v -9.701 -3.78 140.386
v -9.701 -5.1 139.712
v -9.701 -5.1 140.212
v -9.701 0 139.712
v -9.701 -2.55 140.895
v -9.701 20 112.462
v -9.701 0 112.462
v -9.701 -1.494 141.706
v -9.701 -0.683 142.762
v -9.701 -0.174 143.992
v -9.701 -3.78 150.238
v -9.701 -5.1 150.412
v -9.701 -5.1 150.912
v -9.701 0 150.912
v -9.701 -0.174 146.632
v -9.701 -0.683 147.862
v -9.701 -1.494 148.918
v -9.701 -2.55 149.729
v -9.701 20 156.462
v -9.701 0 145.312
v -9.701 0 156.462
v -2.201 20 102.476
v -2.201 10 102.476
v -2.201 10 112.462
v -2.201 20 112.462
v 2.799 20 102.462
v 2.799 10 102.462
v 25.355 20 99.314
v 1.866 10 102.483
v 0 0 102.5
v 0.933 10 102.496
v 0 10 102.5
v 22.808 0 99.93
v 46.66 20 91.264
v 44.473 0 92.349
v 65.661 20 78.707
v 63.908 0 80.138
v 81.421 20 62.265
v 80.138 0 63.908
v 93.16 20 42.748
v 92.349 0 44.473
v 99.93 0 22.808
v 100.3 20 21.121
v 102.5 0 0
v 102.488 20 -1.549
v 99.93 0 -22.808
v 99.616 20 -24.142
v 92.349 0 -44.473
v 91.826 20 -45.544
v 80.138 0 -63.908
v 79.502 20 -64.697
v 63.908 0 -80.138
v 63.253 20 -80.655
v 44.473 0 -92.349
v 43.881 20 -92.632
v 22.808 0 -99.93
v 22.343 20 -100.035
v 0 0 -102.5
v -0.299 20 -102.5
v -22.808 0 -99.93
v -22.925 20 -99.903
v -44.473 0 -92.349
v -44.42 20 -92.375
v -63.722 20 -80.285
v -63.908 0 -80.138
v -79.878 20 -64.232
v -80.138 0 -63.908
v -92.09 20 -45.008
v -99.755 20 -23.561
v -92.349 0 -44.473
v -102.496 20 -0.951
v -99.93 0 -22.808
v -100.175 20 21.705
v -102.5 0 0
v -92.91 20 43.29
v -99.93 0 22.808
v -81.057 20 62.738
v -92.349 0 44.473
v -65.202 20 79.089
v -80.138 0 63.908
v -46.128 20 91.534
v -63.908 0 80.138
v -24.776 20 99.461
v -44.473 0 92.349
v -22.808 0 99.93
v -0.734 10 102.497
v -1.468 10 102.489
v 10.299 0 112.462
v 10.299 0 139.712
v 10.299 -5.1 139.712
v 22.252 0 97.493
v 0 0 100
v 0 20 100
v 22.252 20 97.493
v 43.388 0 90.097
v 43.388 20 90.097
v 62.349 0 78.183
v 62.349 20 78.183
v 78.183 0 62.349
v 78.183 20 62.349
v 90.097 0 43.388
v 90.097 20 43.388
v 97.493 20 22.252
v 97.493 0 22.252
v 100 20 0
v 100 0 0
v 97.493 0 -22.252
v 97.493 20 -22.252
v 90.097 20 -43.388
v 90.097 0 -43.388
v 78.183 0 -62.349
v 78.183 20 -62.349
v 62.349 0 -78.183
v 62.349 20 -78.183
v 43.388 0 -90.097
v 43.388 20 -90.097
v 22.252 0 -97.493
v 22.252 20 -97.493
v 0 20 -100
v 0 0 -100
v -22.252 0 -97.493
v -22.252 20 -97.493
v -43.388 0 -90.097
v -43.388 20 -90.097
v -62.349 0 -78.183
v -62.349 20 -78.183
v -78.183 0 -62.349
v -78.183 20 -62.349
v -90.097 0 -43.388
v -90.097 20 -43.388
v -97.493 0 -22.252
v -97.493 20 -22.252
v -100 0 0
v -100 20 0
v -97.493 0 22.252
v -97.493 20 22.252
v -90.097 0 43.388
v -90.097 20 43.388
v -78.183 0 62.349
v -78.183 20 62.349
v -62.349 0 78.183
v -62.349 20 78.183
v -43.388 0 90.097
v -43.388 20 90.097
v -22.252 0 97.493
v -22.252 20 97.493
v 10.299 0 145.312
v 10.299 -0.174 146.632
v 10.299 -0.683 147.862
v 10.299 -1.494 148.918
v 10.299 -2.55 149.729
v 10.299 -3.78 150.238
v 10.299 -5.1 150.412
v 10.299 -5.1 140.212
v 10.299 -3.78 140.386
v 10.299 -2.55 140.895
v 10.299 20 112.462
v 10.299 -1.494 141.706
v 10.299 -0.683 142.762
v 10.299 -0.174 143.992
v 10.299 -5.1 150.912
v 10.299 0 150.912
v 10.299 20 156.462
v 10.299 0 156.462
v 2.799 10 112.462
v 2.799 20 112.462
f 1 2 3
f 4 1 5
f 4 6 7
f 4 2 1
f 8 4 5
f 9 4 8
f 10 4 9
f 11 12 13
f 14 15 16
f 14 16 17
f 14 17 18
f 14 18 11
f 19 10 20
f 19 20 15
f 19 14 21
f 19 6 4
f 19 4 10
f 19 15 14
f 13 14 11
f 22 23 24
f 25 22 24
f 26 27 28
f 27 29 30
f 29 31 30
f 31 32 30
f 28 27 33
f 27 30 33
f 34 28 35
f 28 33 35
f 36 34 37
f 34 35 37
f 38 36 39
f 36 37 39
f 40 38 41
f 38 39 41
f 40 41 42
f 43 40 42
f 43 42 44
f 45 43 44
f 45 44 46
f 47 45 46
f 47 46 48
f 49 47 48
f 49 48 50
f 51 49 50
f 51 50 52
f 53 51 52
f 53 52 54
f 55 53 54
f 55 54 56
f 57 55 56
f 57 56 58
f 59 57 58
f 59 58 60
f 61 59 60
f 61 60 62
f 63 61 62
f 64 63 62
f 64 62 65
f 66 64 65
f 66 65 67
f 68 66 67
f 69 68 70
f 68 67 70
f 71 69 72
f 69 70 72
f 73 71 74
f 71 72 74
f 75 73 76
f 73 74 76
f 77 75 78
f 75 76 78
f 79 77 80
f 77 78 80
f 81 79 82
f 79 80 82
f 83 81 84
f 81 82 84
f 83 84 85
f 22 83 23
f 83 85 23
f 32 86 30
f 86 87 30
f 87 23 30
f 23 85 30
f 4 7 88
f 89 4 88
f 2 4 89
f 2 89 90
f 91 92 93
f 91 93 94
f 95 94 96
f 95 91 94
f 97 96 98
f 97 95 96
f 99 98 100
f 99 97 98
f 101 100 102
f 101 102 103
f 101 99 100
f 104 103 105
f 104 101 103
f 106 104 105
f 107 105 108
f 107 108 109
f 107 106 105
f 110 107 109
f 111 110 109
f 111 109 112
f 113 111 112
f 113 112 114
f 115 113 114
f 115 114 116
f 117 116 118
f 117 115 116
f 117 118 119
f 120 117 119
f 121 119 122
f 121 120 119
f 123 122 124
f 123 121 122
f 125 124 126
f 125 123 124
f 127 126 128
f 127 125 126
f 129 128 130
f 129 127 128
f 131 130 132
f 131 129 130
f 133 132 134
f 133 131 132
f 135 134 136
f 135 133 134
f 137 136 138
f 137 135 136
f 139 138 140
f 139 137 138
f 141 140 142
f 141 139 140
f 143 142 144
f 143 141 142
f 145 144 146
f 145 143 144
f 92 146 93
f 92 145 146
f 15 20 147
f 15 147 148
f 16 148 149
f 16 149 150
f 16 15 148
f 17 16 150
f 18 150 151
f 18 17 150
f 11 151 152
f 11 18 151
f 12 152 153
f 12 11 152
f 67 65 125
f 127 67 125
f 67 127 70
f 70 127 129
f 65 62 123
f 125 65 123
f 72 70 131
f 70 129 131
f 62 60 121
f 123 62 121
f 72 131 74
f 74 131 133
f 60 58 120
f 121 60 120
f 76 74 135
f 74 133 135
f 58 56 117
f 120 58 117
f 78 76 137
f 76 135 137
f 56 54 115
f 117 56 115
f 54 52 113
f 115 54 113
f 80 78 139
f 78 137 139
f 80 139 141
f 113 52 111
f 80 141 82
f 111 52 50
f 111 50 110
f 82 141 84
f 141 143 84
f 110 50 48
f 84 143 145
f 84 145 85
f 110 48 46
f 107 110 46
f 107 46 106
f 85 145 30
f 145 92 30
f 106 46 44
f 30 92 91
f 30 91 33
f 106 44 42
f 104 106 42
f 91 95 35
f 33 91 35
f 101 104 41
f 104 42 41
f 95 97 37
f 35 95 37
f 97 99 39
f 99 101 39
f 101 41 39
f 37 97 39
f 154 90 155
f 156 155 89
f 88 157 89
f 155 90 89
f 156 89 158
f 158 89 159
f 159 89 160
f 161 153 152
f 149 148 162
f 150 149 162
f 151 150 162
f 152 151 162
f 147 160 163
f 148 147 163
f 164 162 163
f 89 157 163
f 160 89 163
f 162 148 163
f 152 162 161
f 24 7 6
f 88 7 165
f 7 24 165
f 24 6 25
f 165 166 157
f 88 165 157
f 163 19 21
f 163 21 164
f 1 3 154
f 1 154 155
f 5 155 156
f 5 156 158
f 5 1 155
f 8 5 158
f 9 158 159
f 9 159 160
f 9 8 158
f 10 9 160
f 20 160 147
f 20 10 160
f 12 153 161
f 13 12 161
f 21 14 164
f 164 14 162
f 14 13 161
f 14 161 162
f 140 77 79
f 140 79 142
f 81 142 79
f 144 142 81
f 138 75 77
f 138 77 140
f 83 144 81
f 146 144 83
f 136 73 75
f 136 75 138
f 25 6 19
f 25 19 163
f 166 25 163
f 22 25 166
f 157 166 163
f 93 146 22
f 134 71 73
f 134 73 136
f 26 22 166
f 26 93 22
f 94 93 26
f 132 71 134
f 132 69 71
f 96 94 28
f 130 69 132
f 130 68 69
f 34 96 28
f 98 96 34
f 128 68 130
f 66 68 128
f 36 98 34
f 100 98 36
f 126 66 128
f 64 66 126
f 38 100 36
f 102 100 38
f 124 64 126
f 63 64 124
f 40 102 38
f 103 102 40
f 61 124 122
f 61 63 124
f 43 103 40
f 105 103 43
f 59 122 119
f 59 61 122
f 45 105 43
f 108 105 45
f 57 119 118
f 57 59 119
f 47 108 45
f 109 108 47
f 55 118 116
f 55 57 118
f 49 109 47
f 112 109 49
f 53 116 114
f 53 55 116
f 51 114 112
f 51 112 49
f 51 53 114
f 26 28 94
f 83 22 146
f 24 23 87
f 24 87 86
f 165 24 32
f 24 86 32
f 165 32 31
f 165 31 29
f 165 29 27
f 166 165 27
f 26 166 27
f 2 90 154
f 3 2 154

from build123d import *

# Parameters (mm, degrees)
SKETCH1_R           = 102.5
SKETCH1_R_2         = 100
BOSS_EXTRUDE1_DEPTH = 20
BOSS_EXTRUDE2_START = -10
BOSS_EXTRUDE2_DEPTH = 10
SKETCH3_W           = 20
SKETCH3_H           = 20
BOSS_EXTRUDE3_DEPTH = 44
BOSS_EXTRUDE5_DEPTH = 20


with BuildPart() as part:
    # Sketch1 → Boss-Extrude1 (new body)
    with BuildSketch(Plane(origin=(0, 0, 0), x_dir=(1, 0, 0), z_dir=(0, 1, 0))):
        with Locations(Location((0, 0, 0), (0, 0, 270))):
            Circle(SKETCH1_R)
        with Locations(Location((0, 0, 0), (0, 0, 270))):
            Circle(SKETCH1_R_2, mode=Mode.SUBTRACT)
    extrude(amount=BOSS_EXTRUDE1_DEPTH)

    # Sketch2 → Boss-Extrude2 (add)
    with BuildSketch(Plane(origin=(0, 20, 0), x_dir=(1, 0, 0), z_dir=(0, 1, 0)).offset(BOSS_EXTRUDE2_START)):
        with BuildLine():
            ThreePointArc((2.798561789, -102.461788253), (0.298650634, -102.499564915), (-2.201438211, -102.476356638))
            Line((-2.201438211, -102.476356638), (-2.201438211, -112.461788253))
            Line((-2.201438211, -112.461788253), (2.798561789, -112.461788253))
            Line((2.798561789, -112.461788253), (2.798561789, -102.461788253))
        make_face()
    extrude(amount=BOSS_EXTRUDE2_DEPTH)

    # Sketch3 → Boss-Extrude3 (add)
    with BuildSketch(Plane.XY.offset(112.461788253)):
        with Locations((0.298561789, 10)):
            Rectangle(SKETCH3_W, SKETCH3_H)
    extrude(amount=BOSS_EXTRUDE3_DEPTH)

    # Sketch4 → Boss-Extrude5 (add)
    with BuildSketch(Plane.ZY.offset(9.701438211)):
        with BuildLine():
            Line((145.311788254, 0), (139.711788253, 0))
            Line((139.711788253, 0), (139.711788253, -5.1))
            Line((139.711788253, -5.1), (140.211788253, -5.1))
            ThreePointArc((140.211788253, -5.1), (141.705543669, -1.493755415), (145.311788254, 0))
        make_face()
        with BuildLine():
            Line((150.911788253, 0), (145.311788254, 0))
            ThreePointArc((145.311788254, 0), (148.918032837, -1.493755416), (150.411788253, -5.1))
            Line((150.411788253, -5.1), (150.911788253, -5.1))
            Line((150.911788253, -5.1), (150.911788253, 0))
        make_face()
    extrude(amount=-BOSS_EXTRUDE5_DEPTH)


solid = part.part
